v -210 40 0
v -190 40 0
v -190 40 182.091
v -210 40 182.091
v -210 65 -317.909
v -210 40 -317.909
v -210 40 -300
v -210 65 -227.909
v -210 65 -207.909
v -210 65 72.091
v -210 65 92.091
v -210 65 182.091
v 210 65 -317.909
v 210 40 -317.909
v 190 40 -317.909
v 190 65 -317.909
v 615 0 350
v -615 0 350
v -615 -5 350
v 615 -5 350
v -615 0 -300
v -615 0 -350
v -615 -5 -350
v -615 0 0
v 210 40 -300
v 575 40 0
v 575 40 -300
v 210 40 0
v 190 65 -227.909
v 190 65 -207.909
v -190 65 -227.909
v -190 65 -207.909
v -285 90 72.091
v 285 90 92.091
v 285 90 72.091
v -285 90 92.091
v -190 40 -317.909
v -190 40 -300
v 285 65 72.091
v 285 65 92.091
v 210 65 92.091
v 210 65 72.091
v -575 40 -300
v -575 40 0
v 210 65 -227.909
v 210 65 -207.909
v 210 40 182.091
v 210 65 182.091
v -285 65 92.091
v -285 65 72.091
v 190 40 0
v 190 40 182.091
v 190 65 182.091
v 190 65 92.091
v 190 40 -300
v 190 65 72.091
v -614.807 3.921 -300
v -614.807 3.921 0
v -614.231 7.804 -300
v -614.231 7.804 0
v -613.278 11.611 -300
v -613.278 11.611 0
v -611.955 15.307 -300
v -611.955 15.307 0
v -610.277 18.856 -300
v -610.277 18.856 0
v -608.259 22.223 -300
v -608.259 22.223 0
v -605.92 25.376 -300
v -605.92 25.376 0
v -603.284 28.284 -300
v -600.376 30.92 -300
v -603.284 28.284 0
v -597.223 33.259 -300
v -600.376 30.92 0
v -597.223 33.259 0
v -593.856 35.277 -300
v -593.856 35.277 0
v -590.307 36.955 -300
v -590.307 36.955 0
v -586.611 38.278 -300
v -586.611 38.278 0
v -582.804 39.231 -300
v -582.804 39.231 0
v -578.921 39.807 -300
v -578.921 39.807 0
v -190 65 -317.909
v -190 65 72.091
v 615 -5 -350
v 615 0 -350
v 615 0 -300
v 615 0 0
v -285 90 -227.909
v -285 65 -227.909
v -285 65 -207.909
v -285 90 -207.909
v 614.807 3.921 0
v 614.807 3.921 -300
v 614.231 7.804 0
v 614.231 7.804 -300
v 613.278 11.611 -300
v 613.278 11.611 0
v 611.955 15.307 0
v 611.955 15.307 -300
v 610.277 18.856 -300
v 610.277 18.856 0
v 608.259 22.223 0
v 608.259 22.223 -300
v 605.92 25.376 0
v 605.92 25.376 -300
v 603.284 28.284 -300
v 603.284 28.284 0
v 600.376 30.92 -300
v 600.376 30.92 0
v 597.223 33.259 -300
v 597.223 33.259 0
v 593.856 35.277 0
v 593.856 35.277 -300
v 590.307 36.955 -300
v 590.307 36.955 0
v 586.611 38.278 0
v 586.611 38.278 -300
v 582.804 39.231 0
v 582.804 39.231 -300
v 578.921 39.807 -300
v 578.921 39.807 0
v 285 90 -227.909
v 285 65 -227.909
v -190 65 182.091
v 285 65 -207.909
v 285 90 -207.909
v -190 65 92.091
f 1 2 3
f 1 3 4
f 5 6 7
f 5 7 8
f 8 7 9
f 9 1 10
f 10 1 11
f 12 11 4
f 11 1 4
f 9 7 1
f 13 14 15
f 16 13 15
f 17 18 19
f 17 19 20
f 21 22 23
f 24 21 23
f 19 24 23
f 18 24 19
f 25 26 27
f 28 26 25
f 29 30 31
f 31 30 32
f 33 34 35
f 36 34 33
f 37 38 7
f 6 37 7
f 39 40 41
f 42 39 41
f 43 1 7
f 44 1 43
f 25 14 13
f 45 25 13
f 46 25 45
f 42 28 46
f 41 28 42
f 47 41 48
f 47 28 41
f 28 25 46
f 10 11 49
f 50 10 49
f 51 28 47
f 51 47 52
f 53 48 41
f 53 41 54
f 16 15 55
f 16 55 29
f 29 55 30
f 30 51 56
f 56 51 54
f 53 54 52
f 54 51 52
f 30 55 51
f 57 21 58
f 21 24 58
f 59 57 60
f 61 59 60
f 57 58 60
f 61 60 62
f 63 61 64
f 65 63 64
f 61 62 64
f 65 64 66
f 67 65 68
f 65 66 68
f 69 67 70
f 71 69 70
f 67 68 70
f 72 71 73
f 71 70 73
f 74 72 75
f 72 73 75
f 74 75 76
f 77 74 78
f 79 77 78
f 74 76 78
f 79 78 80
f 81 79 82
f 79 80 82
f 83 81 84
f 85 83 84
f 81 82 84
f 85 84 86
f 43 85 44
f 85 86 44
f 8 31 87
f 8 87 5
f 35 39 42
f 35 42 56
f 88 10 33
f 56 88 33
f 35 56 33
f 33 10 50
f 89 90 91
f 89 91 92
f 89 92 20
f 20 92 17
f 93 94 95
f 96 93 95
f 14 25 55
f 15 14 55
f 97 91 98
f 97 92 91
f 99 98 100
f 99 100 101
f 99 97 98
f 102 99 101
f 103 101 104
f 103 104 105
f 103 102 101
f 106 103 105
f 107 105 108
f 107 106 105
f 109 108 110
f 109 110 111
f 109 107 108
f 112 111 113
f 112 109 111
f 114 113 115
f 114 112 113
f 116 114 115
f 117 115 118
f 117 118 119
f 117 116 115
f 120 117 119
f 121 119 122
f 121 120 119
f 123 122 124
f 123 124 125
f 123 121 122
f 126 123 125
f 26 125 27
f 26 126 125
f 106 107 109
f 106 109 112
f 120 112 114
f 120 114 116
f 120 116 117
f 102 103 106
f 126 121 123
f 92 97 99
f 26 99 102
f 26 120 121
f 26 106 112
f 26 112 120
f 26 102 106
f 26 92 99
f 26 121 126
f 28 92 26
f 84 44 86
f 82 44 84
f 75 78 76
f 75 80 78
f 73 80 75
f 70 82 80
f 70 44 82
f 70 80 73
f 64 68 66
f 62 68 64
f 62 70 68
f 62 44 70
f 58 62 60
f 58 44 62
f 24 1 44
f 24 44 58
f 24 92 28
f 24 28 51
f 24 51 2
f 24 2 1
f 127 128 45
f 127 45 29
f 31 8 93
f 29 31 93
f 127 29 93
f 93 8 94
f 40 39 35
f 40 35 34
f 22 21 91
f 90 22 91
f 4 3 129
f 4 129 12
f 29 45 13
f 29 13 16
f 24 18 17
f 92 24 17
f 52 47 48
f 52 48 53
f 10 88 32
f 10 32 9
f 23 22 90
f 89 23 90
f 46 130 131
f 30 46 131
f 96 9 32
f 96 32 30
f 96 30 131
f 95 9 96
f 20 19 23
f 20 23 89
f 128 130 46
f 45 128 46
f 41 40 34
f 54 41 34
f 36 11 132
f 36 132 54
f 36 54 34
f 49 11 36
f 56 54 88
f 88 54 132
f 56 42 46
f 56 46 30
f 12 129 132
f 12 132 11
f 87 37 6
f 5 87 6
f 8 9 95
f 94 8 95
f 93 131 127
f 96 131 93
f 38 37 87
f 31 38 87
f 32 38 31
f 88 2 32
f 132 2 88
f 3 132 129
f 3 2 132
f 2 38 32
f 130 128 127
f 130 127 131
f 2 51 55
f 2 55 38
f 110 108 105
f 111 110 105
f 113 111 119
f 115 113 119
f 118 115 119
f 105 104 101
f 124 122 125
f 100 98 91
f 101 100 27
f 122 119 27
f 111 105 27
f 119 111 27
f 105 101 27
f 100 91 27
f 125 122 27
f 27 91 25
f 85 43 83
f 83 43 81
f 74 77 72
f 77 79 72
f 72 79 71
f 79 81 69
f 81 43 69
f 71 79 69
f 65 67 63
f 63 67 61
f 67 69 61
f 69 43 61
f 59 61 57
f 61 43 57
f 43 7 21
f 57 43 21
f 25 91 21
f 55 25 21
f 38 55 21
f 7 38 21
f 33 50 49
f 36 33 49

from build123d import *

# Parameters (mm, degrees)
F0_W     = 1230
F0_H     = 700
F1_DEPTH = 5
F2_W     = 1230
F2_H     = 300
F3_DEPTH = 40
F4_R     = 40
F5_W     = 20
F5_H     = 500
F6_DEPTH = 25
F7_W     = 570
F7_H     = 20
F8_DEPTH = 25


with BuildPart() as f1:
    # F0 (on Front) → F1 (new body)
    with BuildSketch(Plane.XZ):
        Rectangle(F0_W, F0_H)
    extrude(amount=F1_DEPTH)

    # F2 (on face) → F3 (join)
    with BuildSketch(Plane(origin=(0, 0, 0), x_dir=(-1, 0, 0), z_dir=(0, 1, 0))):
        with Locations((0, -150)):
            Rectangle(F2_W, F2_H)
    extrude(amount=F3_DEPTH)

    # F4
    f4_edges = [f1.edges().sort_by_distance(p)[0] for p in [
        (615, 40, -150),
        (-615, 40, -150),
    ]]
    fillet(f4_edges, radius=F4_R)

    # F5 (on face) → F6 (join)
    with BuildSketch(Plane(origin=(0, 40, 0), x_dir=(-1, 0, 0), z_dir=(0, 1, 0))):
        with Locations((-200, -67.909449)):
            Rectangle(F5_W, F5_H)
        with Locations((200, -67.909449)):
            Rectangle(F5_W, F5_H)
    extrude(amount=F6_DEPTH)

    # F7 (on face) → F8 (join)
    with BuildSketch(Plane(origin=(0, 65, 0), x_dir=(-1, 0, 0), z_dir=(0, 1, 0))):
        with Locations((0, 82.090551)):
            Rectangle(F7_W, F7_H)
        with Locations((0, -217.909449)):
            Rectangle(F7_W, F7_H)
    extrude(amount=F8_DEPTH)


solid = f1.part
